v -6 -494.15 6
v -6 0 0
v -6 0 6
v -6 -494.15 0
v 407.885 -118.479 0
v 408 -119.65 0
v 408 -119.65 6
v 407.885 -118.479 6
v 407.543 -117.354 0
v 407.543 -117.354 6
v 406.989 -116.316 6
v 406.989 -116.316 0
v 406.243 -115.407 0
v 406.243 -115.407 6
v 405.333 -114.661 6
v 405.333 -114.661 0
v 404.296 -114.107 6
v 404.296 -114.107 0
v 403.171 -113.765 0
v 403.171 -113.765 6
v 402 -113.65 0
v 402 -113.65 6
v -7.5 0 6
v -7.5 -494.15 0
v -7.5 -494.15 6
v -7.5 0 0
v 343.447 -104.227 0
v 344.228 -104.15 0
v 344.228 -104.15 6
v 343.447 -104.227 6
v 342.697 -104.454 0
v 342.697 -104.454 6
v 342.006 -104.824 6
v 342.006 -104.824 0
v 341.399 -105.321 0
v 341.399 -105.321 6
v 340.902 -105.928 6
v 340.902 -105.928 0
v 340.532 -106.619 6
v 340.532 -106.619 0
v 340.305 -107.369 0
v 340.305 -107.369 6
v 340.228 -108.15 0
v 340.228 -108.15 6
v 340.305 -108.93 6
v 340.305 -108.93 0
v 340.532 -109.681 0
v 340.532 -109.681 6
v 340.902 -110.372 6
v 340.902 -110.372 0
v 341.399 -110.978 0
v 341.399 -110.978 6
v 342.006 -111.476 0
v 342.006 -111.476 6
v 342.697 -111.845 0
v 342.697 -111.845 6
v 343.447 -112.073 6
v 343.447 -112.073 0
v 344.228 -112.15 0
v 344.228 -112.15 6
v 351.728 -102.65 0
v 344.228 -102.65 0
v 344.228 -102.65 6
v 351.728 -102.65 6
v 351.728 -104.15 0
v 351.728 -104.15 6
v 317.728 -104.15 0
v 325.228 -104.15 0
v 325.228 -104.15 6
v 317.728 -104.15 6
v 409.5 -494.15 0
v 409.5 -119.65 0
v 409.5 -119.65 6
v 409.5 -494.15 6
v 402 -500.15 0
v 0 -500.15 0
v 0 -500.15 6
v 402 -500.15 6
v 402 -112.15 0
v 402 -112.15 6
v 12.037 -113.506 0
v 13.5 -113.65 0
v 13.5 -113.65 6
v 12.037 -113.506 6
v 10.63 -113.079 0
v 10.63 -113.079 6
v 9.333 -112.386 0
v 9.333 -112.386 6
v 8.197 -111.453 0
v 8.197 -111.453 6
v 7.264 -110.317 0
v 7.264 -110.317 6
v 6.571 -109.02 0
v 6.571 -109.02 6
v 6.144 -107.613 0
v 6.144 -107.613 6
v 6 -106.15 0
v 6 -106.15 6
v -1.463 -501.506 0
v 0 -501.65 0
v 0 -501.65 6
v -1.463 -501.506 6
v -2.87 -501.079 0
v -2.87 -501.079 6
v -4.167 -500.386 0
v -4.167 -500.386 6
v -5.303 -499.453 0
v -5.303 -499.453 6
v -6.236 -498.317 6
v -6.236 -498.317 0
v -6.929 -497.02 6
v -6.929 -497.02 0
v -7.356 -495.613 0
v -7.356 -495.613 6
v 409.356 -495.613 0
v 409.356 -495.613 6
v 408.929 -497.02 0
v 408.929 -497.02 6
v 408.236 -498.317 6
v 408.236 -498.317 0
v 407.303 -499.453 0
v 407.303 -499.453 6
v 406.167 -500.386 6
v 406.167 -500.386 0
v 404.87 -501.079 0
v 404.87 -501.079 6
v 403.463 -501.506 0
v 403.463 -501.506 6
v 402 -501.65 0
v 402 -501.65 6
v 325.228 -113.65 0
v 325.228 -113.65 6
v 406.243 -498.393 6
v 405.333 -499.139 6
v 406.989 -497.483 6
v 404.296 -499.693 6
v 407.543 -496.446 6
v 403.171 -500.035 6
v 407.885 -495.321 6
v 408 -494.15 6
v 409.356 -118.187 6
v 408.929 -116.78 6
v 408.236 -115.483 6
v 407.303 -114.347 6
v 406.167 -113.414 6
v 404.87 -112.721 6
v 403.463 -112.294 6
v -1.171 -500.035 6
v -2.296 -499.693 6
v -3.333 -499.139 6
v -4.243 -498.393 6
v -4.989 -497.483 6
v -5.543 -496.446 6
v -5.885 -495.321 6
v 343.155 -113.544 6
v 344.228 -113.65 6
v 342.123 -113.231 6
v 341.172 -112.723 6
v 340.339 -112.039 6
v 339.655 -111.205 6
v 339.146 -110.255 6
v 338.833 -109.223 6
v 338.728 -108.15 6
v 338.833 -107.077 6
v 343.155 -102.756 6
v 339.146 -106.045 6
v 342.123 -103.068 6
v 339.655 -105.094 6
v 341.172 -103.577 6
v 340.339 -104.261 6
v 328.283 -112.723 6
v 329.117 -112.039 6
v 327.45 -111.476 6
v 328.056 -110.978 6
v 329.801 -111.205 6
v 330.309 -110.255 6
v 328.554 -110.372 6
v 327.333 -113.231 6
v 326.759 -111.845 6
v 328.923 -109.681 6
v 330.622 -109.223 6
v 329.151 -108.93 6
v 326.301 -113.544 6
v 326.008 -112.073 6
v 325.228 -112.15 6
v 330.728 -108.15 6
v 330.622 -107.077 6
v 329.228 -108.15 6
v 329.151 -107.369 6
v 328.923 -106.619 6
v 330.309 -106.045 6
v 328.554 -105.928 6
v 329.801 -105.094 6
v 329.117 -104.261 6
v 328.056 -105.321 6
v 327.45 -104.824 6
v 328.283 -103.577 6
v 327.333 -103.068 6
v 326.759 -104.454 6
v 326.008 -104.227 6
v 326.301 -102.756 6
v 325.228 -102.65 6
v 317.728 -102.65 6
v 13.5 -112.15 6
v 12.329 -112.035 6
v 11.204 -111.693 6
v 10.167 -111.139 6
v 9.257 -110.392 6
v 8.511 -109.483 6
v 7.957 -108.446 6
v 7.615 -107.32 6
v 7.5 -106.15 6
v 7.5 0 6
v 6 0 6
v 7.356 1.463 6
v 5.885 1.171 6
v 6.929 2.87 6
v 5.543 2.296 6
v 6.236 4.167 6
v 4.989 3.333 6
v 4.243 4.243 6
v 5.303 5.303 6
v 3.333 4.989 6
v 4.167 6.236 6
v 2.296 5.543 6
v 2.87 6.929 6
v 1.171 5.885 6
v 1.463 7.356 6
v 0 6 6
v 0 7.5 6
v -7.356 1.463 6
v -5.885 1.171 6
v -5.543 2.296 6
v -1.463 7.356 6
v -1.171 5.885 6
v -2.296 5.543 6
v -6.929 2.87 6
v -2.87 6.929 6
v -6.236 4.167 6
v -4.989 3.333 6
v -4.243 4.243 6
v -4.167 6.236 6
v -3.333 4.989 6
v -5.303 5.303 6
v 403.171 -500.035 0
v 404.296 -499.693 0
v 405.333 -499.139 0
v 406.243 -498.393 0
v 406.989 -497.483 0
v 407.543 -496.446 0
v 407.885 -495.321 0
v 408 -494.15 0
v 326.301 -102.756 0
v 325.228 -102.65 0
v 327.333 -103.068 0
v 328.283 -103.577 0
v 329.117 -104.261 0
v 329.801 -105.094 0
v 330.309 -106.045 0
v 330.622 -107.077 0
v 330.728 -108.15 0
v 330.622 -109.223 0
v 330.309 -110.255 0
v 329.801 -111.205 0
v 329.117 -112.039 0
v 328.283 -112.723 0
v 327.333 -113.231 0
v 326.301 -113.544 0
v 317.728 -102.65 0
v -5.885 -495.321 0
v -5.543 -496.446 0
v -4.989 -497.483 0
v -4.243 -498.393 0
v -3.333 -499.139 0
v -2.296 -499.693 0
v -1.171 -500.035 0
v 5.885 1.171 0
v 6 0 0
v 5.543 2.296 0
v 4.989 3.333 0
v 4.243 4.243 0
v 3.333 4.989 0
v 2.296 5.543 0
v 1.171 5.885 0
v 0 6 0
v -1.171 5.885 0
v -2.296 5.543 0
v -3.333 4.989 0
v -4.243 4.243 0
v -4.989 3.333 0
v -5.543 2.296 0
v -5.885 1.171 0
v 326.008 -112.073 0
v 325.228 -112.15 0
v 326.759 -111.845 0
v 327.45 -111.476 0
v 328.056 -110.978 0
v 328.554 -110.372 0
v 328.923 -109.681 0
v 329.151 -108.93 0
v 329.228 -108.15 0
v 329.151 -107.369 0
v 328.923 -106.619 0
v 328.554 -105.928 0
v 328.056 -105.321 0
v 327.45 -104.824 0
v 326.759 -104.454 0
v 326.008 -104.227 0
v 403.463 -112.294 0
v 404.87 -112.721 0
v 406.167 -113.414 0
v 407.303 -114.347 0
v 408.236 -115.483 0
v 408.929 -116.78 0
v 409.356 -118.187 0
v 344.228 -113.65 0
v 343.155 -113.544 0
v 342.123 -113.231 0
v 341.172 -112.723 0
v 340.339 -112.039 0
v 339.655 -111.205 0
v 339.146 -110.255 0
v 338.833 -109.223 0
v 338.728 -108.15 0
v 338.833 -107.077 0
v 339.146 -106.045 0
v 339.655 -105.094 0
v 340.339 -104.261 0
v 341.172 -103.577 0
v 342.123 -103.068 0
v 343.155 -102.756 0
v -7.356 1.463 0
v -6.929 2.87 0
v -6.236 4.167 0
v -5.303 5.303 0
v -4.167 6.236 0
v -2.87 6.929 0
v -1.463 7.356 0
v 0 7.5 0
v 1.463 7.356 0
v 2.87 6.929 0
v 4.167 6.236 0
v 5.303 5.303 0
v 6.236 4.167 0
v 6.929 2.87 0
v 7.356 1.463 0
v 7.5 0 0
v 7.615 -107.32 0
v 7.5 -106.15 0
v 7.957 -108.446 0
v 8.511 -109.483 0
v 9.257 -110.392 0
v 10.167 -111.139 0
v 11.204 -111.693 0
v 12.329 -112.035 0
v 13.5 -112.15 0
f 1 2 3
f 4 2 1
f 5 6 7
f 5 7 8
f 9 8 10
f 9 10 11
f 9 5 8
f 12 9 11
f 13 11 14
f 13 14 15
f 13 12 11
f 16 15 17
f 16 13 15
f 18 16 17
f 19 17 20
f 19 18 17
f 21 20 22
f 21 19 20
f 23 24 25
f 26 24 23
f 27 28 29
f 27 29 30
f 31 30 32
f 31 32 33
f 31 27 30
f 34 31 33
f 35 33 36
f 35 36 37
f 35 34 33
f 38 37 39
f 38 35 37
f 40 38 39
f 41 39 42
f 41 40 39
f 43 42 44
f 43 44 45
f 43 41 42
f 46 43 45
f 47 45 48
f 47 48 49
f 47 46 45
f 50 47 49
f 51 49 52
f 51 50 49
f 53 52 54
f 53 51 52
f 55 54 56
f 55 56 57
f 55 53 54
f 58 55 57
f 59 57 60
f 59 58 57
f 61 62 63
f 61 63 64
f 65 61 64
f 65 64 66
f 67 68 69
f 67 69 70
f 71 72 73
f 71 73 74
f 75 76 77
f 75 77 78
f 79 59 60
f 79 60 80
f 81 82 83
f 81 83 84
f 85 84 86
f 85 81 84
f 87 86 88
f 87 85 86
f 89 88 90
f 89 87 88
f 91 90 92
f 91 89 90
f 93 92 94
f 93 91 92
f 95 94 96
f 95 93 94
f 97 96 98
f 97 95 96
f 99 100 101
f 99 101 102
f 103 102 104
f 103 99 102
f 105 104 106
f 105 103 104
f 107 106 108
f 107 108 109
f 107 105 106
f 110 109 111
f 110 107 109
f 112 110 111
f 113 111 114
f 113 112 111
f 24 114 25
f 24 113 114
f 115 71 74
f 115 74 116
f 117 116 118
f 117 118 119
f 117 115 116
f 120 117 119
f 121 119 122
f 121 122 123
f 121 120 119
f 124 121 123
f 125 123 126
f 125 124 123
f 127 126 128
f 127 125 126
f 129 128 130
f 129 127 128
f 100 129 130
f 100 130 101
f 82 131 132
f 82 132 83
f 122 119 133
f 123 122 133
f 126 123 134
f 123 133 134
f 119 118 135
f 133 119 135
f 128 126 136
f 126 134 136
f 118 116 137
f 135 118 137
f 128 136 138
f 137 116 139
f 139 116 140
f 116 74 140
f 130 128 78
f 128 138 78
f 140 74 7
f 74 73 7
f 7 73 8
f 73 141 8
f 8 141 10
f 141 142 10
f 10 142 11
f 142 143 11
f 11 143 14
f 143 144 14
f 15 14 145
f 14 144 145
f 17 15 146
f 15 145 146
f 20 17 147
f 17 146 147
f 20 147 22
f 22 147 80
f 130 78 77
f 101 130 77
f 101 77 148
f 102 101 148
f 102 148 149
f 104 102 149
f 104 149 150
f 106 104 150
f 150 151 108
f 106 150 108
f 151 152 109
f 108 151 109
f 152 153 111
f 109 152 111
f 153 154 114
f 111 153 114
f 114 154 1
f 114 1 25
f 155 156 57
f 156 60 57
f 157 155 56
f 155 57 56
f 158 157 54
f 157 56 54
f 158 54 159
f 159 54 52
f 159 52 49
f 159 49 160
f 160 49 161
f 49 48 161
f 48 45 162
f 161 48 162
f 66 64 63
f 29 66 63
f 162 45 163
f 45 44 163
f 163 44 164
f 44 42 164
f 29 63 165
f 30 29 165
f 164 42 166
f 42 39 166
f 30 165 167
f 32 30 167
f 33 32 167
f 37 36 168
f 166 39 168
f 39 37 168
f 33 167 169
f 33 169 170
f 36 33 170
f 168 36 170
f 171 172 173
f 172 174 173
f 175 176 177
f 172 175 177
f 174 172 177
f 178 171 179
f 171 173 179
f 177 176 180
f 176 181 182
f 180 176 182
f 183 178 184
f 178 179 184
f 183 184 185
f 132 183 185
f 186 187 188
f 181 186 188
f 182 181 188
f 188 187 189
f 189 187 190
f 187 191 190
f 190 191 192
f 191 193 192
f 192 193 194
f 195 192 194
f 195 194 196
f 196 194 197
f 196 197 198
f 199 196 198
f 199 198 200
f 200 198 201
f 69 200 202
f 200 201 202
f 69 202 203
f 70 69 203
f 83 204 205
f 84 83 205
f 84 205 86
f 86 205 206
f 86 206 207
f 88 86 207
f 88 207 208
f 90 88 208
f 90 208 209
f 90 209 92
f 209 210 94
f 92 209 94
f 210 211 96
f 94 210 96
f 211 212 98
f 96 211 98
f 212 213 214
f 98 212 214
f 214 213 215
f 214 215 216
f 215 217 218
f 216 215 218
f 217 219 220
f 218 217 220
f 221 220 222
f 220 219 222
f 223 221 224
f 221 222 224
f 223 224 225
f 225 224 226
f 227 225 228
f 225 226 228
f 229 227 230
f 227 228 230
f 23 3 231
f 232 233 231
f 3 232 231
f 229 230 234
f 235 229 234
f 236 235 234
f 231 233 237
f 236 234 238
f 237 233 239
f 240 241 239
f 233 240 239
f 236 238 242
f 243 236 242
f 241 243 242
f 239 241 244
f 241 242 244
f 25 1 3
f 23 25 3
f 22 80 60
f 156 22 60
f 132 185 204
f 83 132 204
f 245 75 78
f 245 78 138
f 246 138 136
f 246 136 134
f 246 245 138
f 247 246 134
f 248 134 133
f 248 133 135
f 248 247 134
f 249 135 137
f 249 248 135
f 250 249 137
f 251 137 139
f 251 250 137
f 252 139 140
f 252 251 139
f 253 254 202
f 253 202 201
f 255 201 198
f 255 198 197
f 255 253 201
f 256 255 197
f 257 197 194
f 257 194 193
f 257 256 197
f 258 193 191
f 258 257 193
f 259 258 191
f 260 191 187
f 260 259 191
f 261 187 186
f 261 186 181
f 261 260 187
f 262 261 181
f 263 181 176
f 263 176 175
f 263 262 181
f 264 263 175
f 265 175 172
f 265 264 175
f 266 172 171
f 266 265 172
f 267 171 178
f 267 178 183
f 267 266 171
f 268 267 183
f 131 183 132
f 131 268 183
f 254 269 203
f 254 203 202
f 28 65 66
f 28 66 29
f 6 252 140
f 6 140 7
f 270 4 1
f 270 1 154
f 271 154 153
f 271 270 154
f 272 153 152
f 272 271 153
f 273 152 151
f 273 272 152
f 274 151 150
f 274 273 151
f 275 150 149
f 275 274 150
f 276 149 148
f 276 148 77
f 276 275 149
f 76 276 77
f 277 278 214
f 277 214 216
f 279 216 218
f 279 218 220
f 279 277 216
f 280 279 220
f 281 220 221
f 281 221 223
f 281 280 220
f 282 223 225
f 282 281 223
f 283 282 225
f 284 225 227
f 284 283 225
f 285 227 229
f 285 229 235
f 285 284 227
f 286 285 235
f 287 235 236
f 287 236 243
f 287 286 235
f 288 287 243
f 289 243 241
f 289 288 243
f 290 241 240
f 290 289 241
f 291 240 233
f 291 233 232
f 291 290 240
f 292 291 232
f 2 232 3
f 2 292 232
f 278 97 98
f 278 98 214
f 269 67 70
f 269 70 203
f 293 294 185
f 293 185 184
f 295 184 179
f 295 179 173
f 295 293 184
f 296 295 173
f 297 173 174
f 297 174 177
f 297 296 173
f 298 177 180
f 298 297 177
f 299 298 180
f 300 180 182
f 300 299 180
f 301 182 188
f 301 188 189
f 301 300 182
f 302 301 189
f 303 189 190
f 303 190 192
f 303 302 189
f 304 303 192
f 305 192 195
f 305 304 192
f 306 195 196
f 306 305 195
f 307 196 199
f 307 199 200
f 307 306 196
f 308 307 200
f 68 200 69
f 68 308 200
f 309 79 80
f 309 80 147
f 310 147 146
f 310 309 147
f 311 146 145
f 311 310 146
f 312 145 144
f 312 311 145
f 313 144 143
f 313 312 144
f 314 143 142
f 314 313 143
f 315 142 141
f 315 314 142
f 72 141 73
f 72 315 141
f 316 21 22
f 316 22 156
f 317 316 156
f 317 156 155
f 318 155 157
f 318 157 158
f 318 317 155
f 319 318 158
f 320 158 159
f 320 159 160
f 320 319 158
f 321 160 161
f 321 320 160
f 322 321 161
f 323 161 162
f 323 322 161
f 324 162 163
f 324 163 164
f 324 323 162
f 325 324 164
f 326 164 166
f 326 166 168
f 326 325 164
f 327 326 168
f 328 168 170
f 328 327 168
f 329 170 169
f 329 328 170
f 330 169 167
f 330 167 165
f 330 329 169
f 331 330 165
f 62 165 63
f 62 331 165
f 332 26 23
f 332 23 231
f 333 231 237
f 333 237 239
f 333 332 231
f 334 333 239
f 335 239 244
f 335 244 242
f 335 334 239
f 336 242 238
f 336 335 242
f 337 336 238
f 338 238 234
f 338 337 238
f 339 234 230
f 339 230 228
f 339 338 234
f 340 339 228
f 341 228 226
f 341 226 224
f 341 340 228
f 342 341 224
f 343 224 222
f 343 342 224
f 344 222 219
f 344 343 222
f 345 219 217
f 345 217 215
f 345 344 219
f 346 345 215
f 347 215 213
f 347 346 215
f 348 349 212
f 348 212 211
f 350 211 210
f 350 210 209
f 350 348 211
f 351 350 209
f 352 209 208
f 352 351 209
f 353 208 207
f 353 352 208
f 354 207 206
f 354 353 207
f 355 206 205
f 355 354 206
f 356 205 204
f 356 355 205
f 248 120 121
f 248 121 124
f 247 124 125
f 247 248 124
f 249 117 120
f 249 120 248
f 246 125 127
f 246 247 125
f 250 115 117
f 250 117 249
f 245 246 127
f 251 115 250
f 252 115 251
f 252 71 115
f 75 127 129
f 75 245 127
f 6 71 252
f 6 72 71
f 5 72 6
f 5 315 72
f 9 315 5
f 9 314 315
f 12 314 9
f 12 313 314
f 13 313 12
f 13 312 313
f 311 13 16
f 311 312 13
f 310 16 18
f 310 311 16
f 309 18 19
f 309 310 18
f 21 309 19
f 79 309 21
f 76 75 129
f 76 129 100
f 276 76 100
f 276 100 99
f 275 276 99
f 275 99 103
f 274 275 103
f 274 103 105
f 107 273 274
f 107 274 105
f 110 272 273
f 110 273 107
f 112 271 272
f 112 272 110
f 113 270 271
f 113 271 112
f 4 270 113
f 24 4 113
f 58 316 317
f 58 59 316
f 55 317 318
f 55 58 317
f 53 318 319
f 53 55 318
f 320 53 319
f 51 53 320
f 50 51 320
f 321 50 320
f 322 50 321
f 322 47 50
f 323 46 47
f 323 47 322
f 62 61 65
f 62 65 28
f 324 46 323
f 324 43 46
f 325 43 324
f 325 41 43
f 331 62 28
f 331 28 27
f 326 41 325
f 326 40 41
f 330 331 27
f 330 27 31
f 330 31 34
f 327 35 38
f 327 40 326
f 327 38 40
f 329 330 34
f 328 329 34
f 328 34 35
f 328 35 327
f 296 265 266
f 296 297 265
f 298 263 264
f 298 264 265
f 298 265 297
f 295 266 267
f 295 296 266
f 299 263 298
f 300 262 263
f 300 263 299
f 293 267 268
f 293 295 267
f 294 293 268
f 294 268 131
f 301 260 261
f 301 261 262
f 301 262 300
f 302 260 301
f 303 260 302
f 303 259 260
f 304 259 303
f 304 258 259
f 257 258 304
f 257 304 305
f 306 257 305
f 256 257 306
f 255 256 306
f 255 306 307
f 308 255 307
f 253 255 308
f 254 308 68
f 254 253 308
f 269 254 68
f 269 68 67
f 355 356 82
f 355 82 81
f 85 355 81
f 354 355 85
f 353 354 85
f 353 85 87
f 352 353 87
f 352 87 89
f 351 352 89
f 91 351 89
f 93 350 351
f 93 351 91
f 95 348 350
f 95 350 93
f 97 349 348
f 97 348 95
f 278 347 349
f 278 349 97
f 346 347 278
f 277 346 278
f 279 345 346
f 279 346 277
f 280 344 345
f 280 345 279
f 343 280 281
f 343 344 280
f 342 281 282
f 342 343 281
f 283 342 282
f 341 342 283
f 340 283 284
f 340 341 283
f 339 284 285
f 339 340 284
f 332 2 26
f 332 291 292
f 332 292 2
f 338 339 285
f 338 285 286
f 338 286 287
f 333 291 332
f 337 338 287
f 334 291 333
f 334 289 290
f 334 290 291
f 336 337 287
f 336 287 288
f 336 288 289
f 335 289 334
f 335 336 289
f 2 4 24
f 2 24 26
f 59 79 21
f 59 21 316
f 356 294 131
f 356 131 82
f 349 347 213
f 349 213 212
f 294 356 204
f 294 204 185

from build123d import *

# Parameters (mm, degrees)
BOSS_EXTRUDE1_DEPTH = 6


with BuildPart() as part:
    # Sketch1 → Boss-Extrude1 (new body)
    with BuildSketch(Plane.XY):
        with BuildLine():
            Line((-6, 0), (-6, -494.15))
            ThreePointArc((-6, -494.15), (-4.242640687, -498.392640687), (0, -500.15))
            Line((0, -500.15), (402, -500.15))
            ThreePointArc((402, -500.15), (406.242640687, -498.392640687), (408, -494.15))
            Line((408, -494.15), (408, -119.649819196))
            ThreePointArc((408, -119.649819196), (406.242640687, -115.407178509), (402, -113.649819196))
            Line((402, -113.649819196), (344.227783268, -113.649819196))
            ThreePointArc((344.227783268, -113.649819196), (338.727783268, -108.149819196), (344.227783268, -102.649819196))
            Line((344.227783268, -102.649819196), (351.727783268, -102.649819196))
            Line((351.727783268, -102.649819196), (351.727783268, -104.149819196))
            Line((351.727783268, -104.149819196), (344.227783268, -104.149819196))
            ThreePointArc((344.227783268, -104.149819196), (340.227783268, -108.149819196), (344.227783268, -112.149819196))
            Line((344.227783268, -112.149819196), (402, -112.149819196))
            ThreePointArc((402, -112.149819196), (407.303300859, -114.346518337), (409.5, -119.649819196))
            Line((409.5, -119.649819196), (409.5, -494.15))
            ThreePointArc((409.5, -494.15), (407.303300859, -499.453300859), (402, -501.65))
            Line((402, -501.65), (0, -501.65))
            ThreePointArc((0, -501.65), (-5.303300859, -499.453300859), (-7.5, -494.15))
            Line((-7.5, -494.15), (-7.5, 0))
            ThreePointArc((-7.5, 0), (0, 7.5), (7.5, 0))
            Line((7.5, 0), (7.5, -106.149819196))
            ThreePointArc((7.5, -106.149819196), (9.257359313, -110.392459883), (13.5, -112.149819196))
            Line((13.5, -112.149819196), (325.227783268, -112.149819196))
            ThreePointArc((325.227783268, -112.149819196), (329.227783268, -108.149819196), (325.227783268, -104.149819196))
            Line((325.227783268, -104.149819196), (317.727783268, -104.149819196))
            Line((317.727783268, -104.149819196), (317.727783268, -102.649819196))
            Line((317.727783268, -102.649819196), (325.227783268, -102.649819196))
            ThreePointArc((325.227783268, -102.649819196), (330.727783268, -108.149819196), (325.227783268, -113.649819196))
            Line((325.227783268, -113.649819196), (13.5, -113.649819196))
            ThreePointArc((13.5, -113.649819196), (8.196699141, -111.453120055), (6, -106.149819196))
            Line((6, -106.149819196), (6, 0))
            ThreePointArc((6, 0), (0, 6), (-6, 0))
        make_face()
    extrude(amount=BOSS_EXTRUDE1_DEPTH)


solid = part.part
